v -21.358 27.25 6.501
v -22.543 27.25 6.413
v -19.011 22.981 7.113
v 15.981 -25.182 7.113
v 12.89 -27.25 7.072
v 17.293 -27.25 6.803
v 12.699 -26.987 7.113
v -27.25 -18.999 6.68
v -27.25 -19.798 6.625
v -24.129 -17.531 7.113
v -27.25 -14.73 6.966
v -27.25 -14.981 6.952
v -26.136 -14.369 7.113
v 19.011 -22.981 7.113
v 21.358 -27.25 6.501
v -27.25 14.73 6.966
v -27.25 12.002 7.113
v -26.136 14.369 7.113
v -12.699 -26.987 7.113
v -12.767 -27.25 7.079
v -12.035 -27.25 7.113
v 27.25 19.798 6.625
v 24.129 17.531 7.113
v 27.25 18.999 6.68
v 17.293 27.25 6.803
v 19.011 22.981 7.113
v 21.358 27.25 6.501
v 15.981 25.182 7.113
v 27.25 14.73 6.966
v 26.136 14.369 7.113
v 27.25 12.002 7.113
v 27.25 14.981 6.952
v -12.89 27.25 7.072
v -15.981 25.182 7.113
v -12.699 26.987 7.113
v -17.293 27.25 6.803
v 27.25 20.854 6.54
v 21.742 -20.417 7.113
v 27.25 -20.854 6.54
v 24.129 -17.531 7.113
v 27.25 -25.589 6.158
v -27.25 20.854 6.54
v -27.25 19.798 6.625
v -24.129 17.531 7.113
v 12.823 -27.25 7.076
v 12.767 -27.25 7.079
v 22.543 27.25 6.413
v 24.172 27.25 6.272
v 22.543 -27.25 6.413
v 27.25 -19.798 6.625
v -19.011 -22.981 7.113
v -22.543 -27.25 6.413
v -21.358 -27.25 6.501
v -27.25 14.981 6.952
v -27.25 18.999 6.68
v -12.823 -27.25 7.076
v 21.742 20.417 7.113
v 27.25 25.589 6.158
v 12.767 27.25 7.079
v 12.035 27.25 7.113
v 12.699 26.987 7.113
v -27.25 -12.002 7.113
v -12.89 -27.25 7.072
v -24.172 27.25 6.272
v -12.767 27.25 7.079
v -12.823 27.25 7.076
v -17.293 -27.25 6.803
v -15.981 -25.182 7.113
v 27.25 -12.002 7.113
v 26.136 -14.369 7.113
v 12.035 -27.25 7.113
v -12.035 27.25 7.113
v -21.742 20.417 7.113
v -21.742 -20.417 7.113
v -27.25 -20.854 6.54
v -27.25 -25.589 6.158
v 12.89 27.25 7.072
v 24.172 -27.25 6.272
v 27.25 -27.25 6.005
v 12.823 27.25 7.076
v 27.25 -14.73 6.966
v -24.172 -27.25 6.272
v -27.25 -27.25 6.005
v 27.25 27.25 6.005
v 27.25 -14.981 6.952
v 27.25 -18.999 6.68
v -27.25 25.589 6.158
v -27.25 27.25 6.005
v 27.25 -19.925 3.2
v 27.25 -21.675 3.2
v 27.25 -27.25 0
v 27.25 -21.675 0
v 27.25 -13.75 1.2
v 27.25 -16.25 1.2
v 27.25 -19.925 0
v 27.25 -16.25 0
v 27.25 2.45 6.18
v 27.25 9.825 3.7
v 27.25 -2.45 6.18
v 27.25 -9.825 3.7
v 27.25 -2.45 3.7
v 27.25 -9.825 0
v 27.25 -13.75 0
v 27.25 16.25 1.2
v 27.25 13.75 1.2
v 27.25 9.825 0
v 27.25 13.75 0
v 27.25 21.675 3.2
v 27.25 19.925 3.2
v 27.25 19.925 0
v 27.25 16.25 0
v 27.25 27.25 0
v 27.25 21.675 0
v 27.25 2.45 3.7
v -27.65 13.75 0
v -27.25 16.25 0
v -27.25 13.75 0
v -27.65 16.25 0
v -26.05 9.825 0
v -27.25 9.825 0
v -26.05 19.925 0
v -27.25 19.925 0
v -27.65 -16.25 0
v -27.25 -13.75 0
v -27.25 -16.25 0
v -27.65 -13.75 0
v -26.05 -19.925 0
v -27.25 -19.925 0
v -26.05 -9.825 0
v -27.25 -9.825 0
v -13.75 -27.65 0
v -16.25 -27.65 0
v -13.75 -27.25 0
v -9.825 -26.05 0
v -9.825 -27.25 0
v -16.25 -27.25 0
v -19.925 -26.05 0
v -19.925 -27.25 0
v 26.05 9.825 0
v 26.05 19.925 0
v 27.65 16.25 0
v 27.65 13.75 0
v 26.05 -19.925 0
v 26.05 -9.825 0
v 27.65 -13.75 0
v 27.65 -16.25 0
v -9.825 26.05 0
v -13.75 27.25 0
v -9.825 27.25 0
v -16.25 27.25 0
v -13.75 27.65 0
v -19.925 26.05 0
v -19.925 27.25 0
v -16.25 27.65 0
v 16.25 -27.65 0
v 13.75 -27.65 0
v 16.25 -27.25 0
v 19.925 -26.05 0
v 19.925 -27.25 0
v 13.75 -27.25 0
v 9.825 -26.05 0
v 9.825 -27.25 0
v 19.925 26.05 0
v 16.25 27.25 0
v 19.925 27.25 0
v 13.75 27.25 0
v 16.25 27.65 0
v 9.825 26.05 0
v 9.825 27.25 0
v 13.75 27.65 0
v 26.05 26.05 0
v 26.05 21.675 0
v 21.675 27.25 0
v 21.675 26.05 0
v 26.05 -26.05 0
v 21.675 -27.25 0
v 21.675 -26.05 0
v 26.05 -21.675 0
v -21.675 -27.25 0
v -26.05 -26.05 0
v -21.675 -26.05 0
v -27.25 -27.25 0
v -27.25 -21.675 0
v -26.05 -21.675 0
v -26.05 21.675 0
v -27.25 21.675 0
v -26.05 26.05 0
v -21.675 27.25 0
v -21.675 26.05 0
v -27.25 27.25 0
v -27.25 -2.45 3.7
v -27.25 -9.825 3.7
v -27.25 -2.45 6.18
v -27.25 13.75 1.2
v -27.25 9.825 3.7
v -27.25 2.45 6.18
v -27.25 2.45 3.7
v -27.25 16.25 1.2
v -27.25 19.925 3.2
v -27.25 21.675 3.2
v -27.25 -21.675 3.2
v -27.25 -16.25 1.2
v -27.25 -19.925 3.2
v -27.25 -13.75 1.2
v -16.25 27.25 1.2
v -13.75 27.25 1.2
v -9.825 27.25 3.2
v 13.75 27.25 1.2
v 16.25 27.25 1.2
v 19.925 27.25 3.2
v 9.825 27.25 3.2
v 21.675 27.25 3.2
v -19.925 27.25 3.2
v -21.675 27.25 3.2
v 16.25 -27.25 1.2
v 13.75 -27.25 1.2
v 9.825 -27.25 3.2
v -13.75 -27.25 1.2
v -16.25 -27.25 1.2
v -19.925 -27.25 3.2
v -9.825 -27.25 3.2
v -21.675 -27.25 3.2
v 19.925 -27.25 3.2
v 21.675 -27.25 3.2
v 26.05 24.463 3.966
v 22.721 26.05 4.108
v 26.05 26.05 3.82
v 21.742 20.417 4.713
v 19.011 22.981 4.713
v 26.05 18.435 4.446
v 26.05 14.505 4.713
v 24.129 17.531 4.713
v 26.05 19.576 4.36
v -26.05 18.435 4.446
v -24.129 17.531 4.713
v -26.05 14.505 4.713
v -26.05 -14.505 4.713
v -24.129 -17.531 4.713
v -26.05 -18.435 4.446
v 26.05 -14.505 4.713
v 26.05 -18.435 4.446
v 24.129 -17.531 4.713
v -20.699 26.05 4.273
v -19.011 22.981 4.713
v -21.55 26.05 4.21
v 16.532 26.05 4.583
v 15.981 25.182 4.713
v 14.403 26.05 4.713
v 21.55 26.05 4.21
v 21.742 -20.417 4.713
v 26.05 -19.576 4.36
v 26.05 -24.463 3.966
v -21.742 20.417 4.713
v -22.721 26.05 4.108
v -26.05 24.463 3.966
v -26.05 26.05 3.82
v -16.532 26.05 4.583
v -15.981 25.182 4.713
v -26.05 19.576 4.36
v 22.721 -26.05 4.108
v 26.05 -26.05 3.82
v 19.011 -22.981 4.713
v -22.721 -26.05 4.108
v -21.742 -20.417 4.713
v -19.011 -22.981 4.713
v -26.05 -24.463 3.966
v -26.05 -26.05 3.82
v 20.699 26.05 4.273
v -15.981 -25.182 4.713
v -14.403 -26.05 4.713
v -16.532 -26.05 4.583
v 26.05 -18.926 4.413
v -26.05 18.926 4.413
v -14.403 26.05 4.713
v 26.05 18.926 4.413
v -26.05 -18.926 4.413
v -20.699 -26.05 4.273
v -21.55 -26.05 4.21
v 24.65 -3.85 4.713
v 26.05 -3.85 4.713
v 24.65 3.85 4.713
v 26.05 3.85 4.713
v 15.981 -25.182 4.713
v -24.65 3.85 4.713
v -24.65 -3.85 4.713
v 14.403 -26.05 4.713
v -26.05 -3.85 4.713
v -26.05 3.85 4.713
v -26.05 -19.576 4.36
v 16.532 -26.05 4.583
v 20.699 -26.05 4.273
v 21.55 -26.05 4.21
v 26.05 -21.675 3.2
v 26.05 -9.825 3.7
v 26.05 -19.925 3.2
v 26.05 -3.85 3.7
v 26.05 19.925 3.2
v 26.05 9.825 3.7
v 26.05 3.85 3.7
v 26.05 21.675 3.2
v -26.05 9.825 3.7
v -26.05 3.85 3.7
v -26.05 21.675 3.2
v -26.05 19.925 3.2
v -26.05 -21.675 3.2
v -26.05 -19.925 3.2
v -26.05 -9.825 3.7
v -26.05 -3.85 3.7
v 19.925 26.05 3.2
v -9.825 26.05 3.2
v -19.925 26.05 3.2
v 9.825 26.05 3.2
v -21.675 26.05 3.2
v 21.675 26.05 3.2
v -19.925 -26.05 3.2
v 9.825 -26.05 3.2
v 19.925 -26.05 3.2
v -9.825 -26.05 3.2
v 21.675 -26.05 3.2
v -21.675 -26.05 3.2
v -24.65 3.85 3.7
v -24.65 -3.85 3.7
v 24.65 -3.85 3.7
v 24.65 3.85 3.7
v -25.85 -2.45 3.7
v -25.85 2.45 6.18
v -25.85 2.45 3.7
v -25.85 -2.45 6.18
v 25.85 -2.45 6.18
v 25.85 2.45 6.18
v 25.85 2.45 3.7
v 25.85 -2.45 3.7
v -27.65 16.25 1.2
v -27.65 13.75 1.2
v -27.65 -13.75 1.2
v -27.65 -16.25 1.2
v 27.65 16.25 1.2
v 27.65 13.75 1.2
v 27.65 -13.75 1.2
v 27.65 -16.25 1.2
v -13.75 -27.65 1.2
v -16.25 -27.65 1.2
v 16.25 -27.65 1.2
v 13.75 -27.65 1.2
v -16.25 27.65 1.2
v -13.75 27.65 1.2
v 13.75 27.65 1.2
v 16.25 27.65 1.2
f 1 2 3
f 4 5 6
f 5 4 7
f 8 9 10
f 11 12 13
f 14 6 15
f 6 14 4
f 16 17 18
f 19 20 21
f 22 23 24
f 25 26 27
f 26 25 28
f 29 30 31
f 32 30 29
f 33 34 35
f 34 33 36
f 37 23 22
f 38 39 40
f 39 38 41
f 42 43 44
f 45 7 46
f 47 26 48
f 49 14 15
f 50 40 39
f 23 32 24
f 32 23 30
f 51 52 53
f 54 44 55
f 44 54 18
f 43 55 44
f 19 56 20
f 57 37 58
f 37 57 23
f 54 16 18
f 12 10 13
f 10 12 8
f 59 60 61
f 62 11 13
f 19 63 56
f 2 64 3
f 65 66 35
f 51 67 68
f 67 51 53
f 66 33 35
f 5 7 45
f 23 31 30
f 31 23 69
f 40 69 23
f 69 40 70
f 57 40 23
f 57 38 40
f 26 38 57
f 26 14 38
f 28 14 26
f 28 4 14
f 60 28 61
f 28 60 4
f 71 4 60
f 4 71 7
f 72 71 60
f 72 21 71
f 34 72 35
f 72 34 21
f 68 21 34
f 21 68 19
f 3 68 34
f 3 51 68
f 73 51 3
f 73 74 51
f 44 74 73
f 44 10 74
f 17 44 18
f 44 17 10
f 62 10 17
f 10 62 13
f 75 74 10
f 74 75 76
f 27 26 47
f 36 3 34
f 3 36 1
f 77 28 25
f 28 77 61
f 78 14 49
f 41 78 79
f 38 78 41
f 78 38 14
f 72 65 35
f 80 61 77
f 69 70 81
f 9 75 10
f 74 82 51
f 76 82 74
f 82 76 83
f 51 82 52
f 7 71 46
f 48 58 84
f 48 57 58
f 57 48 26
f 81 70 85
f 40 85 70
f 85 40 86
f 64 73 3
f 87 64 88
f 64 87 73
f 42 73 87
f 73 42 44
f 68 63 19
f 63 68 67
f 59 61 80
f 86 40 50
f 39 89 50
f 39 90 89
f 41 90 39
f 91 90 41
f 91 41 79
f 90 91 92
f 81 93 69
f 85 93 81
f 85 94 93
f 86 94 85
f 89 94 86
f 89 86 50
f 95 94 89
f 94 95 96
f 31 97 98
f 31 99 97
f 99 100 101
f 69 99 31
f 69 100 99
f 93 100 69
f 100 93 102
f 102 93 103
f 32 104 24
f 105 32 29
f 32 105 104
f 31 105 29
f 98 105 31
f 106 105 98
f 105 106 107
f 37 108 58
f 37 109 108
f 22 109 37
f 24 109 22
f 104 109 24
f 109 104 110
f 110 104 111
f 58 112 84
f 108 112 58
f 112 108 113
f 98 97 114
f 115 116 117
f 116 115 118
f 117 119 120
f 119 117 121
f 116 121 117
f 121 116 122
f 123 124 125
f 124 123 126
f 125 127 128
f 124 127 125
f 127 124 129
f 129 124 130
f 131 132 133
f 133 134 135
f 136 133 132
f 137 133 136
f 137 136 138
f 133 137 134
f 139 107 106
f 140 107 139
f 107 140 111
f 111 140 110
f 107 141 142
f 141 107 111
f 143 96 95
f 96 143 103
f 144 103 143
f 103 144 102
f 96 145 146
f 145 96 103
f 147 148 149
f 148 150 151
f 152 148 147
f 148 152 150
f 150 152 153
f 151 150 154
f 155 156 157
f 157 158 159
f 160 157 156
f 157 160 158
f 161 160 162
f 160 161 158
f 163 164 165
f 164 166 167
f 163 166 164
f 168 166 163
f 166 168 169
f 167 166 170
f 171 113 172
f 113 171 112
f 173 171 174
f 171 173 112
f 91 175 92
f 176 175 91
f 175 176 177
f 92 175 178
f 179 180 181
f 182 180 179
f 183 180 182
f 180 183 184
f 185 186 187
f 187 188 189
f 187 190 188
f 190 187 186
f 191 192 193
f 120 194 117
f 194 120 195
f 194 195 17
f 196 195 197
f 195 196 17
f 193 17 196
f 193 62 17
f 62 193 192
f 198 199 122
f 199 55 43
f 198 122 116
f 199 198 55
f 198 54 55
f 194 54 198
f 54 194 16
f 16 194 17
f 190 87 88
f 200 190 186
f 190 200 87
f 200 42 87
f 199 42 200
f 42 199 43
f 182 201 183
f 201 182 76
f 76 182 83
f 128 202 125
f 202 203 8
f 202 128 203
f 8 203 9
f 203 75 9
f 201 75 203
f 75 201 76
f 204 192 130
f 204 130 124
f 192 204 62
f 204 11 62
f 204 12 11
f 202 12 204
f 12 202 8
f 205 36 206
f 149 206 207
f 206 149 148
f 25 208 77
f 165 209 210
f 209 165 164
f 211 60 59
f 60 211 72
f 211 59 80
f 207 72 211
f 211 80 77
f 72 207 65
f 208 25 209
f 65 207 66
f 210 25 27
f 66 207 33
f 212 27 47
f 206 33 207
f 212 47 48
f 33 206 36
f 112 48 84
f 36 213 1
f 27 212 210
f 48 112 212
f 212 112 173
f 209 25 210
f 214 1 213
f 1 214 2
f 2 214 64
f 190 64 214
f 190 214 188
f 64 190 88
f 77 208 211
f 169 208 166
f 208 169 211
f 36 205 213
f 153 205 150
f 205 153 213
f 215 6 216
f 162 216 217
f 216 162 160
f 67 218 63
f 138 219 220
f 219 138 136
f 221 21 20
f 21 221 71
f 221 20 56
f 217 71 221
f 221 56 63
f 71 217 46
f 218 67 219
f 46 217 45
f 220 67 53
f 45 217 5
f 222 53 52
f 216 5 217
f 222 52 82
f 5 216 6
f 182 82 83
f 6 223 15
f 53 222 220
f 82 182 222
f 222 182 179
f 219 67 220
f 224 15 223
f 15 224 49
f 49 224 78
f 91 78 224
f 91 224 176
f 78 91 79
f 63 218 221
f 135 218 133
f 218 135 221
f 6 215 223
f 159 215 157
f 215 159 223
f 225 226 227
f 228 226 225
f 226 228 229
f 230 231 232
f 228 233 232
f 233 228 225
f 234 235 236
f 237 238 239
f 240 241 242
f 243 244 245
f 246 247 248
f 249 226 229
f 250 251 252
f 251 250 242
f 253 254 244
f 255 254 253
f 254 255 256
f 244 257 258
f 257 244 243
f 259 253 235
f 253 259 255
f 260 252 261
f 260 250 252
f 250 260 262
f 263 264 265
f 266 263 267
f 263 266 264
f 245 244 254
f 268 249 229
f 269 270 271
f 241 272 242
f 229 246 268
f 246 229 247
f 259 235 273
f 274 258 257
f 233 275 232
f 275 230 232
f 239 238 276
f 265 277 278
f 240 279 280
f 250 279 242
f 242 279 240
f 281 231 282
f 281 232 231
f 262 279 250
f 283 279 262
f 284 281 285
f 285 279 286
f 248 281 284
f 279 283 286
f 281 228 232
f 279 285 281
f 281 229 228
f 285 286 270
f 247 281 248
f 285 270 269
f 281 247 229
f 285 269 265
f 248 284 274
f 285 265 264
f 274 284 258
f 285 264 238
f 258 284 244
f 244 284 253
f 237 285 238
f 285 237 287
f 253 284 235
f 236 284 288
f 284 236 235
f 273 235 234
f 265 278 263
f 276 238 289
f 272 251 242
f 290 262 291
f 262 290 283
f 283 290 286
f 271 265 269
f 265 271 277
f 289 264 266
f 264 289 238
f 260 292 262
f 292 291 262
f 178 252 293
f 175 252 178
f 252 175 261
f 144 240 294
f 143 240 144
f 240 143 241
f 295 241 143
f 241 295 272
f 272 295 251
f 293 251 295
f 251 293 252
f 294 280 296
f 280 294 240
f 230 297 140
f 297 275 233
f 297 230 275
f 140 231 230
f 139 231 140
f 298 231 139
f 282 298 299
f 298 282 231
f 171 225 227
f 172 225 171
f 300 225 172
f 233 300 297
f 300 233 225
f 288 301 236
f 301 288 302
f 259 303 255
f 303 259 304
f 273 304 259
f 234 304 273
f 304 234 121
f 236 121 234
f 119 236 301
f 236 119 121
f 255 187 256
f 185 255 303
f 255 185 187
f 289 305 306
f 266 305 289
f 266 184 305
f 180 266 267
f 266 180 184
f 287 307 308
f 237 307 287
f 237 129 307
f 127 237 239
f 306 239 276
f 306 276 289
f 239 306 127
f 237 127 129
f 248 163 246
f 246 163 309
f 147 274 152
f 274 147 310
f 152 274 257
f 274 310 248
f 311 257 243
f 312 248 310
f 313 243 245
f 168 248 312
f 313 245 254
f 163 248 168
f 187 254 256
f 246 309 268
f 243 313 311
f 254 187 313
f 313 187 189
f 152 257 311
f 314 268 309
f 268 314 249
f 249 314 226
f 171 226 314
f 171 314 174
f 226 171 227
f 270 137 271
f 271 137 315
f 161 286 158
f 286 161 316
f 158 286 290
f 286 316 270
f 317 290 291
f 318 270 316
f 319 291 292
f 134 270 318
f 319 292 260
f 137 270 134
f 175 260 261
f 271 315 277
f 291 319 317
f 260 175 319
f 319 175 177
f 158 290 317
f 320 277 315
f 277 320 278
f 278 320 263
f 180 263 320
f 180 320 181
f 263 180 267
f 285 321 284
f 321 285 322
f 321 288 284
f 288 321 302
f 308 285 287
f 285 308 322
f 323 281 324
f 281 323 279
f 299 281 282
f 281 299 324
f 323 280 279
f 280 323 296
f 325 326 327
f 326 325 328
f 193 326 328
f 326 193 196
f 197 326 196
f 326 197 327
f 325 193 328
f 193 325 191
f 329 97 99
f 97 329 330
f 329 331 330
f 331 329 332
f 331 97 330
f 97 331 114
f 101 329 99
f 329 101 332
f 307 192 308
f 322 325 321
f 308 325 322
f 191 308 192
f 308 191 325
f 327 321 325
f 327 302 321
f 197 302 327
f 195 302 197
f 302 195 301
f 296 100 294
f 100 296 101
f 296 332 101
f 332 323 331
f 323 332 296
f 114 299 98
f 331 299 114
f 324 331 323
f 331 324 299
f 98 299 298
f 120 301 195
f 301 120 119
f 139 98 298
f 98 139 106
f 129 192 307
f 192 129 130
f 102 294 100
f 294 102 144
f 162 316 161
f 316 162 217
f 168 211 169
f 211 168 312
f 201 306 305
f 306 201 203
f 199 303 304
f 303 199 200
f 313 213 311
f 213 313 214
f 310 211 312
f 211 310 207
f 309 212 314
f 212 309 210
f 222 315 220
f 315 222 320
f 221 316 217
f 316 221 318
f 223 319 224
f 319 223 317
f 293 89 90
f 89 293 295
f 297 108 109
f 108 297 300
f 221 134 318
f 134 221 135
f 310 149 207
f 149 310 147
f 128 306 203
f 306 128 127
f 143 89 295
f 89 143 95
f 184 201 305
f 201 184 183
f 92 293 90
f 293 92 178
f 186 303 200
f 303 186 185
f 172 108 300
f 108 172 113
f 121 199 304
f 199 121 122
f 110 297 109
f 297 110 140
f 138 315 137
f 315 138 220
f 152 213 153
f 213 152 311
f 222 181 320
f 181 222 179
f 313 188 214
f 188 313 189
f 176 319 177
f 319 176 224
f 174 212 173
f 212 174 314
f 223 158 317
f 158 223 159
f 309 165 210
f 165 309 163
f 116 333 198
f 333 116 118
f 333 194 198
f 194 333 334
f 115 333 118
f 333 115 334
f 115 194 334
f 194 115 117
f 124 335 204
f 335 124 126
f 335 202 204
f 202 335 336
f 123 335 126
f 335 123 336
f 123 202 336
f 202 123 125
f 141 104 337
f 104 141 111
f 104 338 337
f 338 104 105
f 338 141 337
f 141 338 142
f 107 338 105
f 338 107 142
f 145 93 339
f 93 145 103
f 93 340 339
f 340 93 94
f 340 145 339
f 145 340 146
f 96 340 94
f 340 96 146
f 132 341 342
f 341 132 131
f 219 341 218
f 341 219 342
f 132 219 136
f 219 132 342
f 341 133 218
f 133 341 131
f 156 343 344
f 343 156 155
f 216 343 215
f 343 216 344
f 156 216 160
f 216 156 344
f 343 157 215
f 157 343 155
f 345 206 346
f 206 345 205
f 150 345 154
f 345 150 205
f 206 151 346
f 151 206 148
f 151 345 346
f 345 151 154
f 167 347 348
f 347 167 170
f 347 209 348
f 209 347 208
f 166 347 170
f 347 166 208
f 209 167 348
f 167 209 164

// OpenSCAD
wymiarZewX = 54.5;
wymiarZewY = 54.5;
wymiarZewZ = 9.5; // czubek kuli
wymiarPomZ = 6.2; // "kant" kuli
wymiarWewX = 51.7;
wymiarWewY = 51.7;
gruboscScianki = 2.4;
gruboscPizdryka = 1.25;
dlugoscPizdryka = 7.7;
offsetPidryka = 4.6;
sphereRadius = 475;

//$fn=256;
$fn=50;

     

zaslepka();

module roundedPanel()
{
    difference()
    {
        spherePosZ = -sphereRadius + wymiarZewZ - wymiarPomZ;
        
        intersection()
        {
            translate([0,0,spherePosZ])
            {
                sphere(r = sphereRadius);
            }
            cube(size = [wymiarZewX,wymiarZewY,wymiarZewZ], center = true);
        }

        intersection()
        {
            translate([0,0,spherePosZ - gruboscScianki])
            {
                sphere(r = sphereRadius);
            }
            translate([0,0,-gruboscScianki])
            {
                cube(size = [wymiarZewX - gruboscScianki,wymiarZewY - gruboscScianki,wymiarZewZ], center = true);
            }
        }
    }
}

module zaslepka()
{
    wnekaSzerokoscDuza = 19.65;
    wnekaSzerokoscMala = 1.75;
    wnekaWysokoscA = 3.70; // wneka B (pod zaczep) x 2
    wnekaWysokoscB = 3.20; // wneka A x 2 
    wnekaWysokoscC = wnekaWysokoscB; // mini wneka x 8
    
    boxMiniOuterX = 2.6;
    boxMiniOuterY = 7.7;
    boxMiniOuterZ = 4.0;
    boxMiniInnerX = 1.4;
    boxMiniInnerY = 4.9;
    boxMiniInnerZ = 3.18;
    
    offsetWnekaMini = 20.8;
    offsetWypustMini = 15.0;
    
    union()
    {
        difference()
        {
            difference()
            {
                union ()
                {
                    //baza
                    translate([0,0,wymiarZewZ/2])
                    {
                        roundedPanel();
                    }
                    //bloczki zew
                    translate([-wymiarZewX/2,-boxMiniOuterY/2,boxMiniOuterZ/2])
                    {
                        cube(size = [boxMiniOuterX, boxMiniOuterY,5.0], center = false);
                    }
                    translate([wymiarZewX/2 - boxMiniOuterX,-boxMiniOuterY/2,boxMiniOuterZ/2])
                    {
                        cube(size = [boxMiniOuterX, boxMiniOuterY,5.0], center = false);
                    }
                }
                union()
                {
                    // bloczki wew
                    translate([-wymiarZewX/2,-boxMiniInnerY/2,boxMiniOuterZ - 1])
                    {
                        cube(size = [boxMiniInnerX, boxMiniInnerY,boxMiniInnerZ], center = false);
                    }
                    translate([wymiarZewX/2 - boxMiniInnerX, -boxMiniInnerY/2,boxMiniOuterZ - 1])
                    {
                        cube(size = [boxMiniInnerX, boxMiniInnerY,boxMiniInnerZ], center = false);
                    }
                }
            }
            union ()
            {
                // wycinki szerokie
                translate([0,0,wnekaWysokoscA/2])
                {
                   cube(size = [wymiarZewX + 10, wnekaSzerokoscDuza, wnekaWysokoscA], center = true);
                }
                translate([0,0,wnekaWysokoscB/2])
                {
                    cube(size = [wnekaSzerokoscDuza, wymiarZewY + 10, wnekaWysokoscB], center = true);
                }
                // wycinki wąskie
                translate([0,-offsetWnekaMini,wnekaWysokoscC/2])
                {
                   cube(size = [wymiarZewX + 10, wnekaSzerokoscMala, wnekaWysokoscC], center = true);
                }
                translate([0,offsetWnekaMini,wnekaWysokoscC/2])
                {
                   cube(size = [wymiarZewX + 10, wnekaSzerokoscMala, wnekaWysokoscC], center = true);
                }
                translate([-offsetWnekaMini,0,wnekaWysokoscC/2])
                {
                   cube(size = [wnekaSzerokoscMala, wymiarZewY + 10, wnekaWysokoscC], center = true);
                }
                translate([offsetWnekaMini,0,wnekaWysokoscC/2])
                {
                   cube(size = [wnekaSzerokoscMala, wymiarZewY + 10, wnekaWysokoscC], center = true);
                }
            }
        }
       /*
          //Lid clips
          translate([-wymiarZewX / 2 + (1.5 * gruboscScianki), offsetPidryka, dlugoscPizdryka - (0.5 * gruboscScianki)])
              rotate([0, 180, 90]) clip(clipWidth = gruboscPizdryka, clipHeight = dlugoscPizdryka);
          translate([wymiarZewX / 2 - (1.5 * gruboscScianki), -offsetPidryka, dlugoscPizdryka - (0.5 *  gruboscScianki)])
              rotate([0, 180, 270]) clip(clipWidth = gruboscPizdryka, clipHeight = dlugoscPizdryka);
          translate([-wymiarZewX / 2 + (1.5 * gruboscScianki), -offsetPidryka, dlugoscPizdryka - (0.5 *  gruboscScianki)])
              rotate([0, 180, 90]) clip(clipWidth = gruboscPizdryka, clipHeight = dlugoscPizdryka);
          translate([wymiarZewX / 2 - (1.5 * gruboscScianki), offsetPidryka, dlugoscPizdryka - (0.5 *  gruboscScianki)])
              rotate([0, 180, 270]) clip(clipWidth = gruboscPizdryka, clipHeight = dlugoscPizdryka);*/
        
        // mikro pizdryki
          translate([-wymiarZewX / 2, offsetWypustMini, 0.6])
              rotate([0, 180, 90]) cube (size = [2.5, 0.8, 1.2], center = true);
          translate([-wymiarZewX / 2, -offsetWypustMini, 0.6])
              rotate([0, 180, 90]) cube (size = [2.5, 0.8, 1.2], center = true);
          translate([wymiarZewX / 2, offsetWypustMini, 0.6])
              rotate([0, 180, 90]) cube (size = [2.5, 0.8, 1.2], center = true);
          translate([wymiarZewX / 2, -offsetWypustMini, 0.6])
              rotate([0, 180, 90]) cube (size = [2.5, 0.8, 1.2], center = true);
          translate([-offsetWypustMini, -wymiarZewY / 2, 0.6])
              rotate([0, 180, 270]) cube (size = [0.8, 2.5, 1.2], center = true);
          translate([offsetWypustMini, -wymiarZewY / 2, 0.6])
              rotate([0, 180, 270]) cube (size = [0.8, 2.5, 1.2], center = true);
          translate([-offsetWypustMini, wymiarZewY / 2, 0.6])
              rotate([0, 180, 270]) cube (size = [0.8, 2.5, 1.2], center = true);
          translate([offsetWypustMini, wymiarZewY / 2, 0.6])
              rotate([0, 180, 270]) cube (size = [0.8, 2.5, 1.2], center = true);
    }
}


//Create a clip that snapps into a clipHole
module clip(clipWidth = 5, clipDepth = 5, clipHeight = 5, lipDepth = 1.5, lipHeight = 2.4)
{
  translate([-clipWidth/2, -(clipDepth-lipDepth), 0]) rotate([90, 0, 90])
  linear_extrude(height = clipWidth, convexity = 10)
    polygon(  points=[  [0, 0], 
            [clipDepth - lipDepth, 0],
            [clipDepth - lipDepth, clipHeight - lipHeight],
            [clipDepth - 0.25, clipHeight - lipHeight],
            [clipDepth, clipHeight - lipHeight + 0.25],
            [clipDepth - lipDepth * 0.8, clipHeight],
            [(clipDepth - lipDepth) * 0.3, clipHeight] 
            ], 
        paths=[[0,1,2,3,4,5,6,7]]
      );
}
